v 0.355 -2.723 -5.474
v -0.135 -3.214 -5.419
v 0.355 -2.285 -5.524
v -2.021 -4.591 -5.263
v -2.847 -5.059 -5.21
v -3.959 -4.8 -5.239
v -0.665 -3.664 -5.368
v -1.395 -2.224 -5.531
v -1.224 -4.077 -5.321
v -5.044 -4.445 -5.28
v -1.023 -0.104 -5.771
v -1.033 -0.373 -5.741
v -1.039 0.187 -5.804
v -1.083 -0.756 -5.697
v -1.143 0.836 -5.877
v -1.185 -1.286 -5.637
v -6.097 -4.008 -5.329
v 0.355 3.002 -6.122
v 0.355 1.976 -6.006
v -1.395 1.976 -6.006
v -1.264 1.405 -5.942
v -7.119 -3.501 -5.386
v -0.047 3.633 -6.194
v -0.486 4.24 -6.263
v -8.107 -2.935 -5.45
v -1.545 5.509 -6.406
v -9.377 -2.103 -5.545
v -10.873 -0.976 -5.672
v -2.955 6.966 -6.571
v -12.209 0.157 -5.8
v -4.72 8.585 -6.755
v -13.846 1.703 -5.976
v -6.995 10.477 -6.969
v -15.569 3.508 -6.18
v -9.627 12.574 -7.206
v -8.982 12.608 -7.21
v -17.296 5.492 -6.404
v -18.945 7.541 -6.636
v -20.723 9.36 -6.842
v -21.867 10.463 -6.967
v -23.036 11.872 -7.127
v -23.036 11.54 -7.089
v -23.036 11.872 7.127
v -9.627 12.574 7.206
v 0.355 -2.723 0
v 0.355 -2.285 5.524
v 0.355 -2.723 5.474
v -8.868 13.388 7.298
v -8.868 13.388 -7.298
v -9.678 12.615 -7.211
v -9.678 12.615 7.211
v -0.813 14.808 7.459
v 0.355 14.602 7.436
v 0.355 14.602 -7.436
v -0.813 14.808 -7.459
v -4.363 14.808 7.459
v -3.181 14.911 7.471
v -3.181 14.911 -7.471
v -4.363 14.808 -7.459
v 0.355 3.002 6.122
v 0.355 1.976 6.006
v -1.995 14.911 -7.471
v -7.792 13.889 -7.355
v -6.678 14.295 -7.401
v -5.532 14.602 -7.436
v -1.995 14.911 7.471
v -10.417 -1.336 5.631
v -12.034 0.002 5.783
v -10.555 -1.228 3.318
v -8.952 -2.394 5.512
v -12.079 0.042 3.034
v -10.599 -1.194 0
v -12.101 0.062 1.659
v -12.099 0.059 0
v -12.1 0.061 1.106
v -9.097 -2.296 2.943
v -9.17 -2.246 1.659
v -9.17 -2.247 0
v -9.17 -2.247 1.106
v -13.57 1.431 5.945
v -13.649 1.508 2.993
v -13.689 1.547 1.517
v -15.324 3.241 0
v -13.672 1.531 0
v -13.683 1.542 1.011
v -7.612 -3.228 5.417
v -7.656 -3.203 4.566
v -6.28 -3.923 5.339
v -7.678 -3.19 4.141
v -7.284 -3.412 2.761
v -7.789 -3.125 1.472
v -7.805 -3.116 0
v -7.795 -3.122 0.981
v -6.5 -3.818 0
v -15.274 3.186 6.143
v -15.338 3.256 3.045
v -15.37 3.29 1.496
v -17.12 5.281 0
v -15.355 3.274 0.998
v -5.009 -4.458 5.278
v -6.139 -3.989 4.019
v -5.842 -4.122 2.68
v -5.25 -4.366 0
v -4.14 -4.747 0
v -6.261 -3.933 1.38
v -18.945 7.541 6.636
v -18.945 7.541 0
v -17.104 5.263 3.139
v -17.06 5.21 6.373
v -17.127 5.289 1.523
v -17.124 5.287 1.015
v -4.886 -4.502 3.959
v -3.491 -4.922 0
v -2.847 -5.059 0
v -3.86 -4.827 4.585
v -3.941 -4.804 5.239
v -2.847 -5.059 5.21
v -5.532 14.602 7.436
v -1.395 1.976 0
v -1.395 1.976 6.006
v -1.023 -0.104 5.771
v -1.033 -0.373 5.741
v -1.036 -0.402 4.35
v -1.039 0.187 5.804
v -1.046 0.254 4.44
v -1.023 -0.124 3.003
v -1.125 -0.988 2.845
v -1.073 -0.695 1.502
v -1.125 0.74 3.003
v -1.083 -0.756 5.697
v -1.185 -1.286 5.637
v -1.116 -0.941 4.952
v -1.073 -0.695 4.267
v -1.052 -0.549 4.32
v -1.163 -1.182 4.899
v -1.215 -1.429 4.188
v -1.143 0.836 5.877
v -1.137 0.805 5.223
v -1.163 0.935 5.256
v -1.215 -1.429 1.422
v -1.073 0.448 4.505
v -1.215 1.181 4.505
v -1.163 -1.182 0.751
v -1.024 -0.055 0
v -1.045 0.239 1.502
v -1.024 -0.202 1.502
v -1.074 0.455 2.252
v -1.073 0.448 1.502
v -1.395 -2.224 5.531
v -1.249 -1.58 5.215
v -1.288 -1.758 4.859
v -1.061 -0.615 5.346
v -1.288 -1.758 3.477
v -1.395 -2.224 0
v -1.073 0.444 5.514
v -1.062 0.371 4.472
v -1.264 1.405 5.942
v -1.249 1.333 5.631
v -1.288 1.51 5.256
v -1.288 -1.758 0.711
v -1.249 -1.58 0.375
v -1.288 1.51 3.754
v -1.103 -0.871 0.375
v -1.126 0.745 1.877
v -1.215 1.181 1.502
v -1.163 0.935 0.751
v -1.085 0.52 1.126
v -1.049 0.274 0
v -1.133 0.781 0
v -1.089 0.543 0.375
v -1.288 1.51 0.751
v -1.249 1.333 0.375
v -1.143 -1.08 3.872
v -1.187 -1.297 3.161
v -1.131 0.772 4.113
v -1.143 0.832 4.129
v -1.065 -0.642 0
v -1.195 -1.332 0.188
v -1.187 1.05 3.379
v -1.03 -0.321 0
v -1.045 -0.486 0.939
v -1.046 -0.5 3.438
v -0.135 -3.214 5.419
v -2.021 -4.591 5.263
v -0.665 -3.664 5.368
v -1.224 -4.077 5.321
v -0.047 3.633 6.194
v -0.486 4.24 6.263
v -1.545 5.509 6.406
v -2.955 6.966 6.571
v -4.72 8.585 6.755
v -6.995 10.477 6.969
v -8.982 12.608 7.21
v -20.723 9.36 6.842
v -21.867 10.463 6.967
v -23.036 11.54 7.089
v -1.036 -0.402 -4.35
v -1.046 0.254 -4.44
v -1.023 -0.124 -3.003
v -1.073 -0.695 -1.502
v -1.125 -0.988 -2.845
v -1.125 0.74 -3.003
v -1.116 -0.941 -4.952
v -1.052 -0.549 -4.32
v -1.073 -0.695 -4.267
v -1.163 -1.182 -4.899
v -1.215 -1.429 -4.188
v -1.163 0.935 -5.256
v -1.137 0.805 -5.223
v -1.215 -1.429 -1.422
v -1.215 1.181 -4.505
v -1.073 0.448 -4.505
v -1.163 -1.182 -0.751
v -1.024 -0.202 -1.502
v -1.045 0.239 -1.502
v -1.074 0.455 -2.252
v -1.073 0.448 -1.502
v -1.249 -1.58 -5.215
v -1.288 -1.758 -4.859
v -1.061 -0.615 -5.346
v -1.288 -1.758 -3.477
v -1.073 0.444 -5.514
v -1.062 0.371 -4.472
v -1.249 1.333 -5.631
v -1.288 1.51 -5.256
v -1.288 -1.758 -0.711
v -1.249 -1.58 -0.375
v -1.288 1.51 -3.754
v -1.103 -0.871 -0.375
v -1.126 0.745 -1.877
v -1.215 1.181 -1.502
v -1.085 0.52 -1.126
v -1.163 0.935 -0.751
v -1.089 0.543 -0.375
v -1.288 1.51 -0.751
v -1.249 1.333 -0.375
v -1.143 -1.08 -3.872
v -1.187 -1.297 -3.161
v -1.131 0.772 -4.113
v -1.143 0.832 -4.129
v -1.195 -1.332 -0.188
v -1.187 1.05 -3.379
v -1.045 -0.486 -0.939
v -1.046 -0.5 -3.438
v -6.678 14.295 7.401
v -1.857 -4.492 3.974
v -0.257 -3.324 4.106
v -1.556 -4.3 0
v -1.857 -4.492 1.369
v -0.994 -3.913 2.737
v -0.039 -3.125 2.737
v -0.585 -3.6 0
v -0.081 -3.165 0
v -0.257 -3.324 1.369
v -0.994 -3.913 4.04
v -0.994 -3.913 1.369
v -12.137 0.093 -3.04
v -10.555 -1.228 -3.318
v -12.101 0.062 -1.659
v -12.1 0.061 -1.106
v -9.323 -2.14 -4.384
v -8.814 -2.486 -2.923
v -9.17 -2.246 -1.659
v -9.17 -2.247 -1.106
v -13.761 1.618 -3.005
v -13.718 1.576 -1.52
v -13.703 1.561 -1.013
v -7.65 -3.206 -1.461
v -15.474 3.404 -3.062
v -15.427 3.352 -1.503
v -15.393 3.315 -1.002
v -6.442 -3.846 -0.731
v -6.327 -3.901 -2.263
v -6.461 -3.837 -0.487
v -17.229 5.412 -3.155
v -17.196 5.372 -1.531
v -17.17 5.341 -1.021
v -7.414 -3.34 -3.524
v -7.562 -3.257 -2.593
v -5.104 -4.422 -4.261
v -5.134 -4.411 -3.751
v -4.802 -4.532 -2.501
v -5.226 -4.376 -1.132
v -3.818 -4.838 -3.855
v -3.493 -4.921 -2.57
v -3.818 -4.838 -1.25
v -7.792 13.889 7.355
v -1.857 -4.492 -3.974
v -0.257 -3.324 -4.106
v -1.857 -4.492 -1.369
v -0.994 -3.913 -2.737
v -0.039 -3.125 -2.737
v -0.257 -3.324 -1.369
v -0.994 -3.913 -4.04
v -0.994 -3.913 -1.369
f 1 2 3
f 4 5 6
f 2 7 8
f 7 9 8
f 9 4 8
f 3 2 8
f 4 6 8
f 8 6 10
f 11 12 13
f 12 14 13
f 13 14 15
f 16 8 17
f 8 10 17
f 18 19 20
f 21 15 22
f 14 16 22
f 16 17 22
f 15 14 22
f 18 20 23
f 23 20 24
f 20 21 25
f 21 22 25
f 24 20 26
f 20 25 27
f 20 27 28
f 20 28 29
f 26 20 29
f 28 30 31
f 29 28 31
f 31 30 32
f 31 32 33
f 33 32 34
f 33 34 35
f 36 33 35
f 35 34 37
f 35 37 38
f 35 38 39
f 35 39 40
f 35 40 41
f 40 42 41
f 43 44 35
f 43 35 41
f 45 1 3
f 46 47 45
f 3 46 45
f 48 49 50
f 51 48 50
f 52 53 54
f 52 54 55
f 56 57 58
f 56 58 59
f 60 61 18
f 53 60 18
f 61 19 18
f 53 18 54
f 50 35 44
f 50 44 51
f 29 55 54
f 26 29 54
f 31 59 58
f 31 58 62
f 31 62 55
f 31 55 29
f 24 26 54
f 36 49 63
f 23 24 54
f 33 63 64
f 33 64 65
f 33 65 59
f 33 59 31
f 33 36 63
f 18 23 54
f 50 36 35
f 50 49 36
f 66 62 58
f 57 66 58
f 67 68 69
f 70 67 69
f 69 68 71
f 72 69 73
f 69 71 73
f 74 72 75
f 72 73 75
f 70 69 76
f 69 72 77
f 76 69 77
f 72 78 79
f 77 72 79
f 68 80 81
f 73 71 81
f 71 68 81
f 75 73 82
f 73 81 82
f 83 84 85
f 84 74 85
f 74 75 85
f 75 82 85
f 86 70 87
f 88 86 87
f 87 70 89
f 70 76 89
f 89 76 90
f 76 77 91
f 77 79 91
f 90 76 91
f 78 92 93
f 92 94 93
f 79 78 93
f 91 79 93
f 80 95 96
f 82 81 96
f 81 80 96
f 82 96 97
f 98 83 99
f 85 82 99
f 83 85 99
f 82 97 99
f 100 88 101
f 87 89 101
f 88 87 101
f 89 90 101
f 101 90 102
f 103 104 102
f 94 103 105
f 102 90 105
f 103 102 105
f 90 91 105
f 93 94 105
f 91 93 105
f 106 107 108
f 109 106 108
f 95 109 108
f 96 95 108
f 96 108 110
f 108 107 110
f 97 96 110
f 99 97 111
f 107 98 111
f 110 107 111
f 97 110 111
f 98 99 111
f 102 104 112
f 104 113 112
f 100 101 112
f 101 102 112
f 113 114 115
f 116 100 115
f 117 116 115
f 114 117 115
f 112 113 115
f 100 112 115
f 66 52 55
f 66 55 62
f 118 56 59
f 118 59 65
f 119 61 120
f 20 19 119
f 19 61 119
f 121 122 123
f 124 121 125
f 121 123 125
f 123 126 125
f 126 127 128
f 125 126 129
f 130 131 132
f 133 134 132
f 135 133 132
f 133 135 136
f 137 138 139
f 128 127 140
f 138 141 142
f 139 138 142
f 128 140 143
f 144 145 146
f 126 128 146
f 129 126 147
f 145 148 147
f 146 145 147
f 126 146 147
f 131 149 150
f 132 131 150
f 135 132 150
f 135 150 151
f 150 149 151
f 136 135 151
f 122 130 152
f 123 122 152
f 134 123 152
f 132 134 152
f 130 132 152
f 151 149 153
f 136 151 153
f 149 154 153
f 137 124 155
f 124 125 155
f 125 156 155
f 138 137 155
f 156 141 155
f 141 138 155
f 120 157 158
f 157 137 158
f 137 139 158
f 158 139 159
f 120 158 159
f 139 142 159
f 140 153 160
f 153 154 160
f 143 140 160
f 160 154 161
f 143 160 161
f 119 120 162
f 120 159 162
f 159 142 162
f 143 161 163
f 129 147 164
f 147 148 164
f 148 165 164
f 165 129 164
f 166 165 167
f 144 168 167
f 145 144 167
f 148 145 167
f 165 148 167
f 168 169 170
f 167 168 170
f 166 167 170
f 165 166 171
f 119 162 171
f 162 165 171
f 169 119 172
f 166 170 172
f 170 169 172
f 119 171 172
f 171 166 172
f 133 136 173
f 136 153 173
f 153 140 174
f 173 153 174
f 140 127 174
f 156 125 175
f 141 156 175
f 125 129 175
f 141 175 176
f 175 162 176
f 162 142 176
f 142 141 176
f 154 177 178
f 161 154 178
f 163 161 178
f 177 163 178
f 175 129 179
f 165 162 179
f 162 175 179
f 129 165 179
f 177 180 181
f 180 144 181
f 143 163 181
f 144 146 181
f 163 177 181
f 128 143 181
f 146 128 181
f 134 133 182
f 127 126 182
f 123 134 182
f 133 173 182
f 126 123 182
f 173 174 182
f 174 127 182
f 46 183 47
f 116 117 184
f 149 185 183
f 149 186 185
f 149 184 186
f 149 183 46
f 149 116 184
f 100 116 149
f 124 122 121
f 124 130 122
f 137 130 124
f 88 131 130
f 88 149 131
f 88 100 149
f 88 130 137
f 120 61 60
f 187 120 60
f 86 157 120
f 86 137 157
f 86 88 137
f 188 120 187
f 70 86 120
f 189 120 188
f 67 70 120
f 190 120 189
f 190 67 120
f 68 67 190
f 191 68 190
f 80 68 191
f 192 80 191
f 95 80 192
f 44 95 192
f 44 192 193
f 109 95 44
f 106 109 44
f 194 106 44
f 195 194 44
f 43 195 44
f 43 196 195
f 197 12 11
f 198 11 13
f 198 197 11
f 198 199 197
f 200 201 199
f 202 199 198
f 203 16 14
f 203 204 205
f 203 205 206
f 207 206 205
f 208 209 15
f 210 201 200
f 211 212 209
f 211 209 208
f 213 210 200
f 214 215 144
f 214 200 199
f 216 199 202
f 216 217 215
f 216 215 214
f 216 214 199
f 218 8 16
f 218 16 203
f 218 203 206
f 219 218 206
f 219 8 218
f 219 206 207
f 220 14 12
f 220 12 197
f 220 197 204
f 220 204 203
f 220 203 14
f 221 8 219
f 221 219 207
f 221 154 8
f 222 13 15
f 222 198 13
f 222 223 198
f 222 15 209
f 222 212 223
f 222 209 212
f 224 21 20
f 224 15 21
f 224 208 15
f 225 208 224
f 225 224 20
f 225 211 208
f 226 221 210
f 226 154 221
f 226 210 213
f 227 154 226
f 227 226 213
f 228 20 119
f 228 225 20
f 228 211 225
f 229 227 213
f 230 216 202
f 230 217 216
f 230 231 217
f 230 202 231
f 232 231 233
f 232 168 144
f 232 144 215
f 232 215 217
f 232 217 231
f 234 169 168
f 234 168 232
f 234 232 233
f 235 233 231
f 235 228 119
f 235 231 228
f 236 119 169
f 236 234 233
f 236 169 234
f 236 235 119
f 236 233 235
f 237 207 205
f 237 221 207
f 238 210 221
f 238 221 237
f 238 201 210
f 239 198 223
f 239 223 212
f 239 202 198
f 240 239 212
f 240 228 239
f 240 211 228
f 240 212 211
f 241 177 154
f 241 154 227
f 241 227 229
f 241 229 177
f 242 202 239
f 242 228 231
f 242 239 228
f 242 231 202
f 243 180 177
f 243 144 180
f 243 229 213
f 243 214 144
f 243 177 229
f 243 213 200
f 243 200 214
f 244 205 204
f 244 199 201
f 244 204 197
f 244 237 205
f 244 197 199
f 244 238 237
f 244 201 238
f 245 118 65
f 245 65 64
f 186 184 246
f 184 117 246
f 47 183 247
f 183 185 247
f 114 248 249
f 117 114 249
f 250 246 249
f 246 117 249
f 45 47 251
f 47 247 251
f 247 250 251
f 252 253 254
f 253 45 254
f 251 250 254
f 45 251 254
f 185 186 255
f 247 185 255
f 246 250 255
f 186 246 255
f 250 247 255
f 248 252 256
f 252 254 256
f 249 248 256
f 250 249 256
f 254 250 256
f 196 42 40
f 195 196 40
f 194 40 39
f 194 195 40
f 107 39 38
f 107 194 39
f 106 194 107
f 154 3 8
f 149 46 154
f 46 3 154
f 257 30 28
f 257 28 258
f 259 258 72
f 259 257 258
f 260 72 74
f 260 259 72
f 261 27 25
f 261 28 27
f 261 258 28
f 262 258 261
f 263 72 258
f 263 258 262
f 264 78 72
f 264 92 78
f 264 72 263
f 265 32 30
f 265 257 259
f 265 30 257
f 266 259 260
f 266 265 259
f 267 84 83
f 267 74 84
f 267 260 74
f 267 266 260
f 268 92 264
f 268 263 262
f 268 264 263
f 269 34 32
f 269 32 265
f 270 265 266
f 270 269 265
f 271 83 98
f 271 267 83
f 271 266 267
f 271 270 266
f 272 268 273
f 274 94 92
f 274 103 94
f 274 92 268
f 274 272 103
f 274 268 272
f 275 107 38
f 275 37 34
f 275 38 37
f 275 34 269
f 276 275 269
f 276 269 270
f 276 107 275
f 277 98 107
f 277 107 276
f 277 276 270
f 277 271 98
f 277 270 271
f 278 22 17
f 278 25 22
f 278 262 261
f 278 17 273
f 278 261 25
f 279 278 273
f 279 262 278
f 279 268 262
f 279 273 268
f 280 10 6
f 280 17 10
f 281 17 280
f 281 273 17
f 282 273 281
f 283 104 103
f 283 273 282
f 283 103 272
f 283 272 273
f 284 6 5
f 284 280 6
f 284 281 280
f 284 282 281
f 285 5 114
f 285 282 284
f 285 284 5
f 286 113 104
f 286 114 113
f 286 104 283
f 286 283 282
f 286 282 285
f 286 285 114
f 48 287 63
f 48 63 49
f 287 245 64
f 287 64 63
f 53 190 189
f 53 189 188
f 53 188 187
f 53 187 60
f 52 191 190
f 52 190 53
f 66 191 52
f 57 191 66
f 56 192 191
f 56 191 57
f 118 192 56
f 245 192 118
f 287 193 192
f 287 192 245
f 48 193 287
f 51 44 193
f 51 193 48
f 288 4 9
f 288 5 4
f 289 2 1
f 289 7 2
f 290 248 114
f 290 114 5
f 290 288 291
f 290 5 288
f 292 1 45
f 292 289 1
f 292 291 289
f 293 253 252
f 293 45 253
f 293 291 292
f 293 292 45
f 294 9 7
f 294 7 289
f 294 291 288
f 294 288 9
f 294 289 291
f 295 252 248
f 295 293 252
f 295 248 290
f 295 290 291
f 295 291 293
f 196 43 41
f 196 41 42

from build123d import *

# Parameters (mm, degrees)
SALIENTE_EXTRUIR1_DEPTH      = 7.21
SALIENTE_EXTRUIR2_DEPTH      = 7.21
SALIENTE_EXTRUIR2_DEPTH_BACK = 7.21
CORTAR_EXTRUIR2_DEPTH        = 28.232395202
CORTAR_EXTRUIR2_DEPTH_BACK   = 28.232395202
SALIENTE_EXTRUIR3_START      = -5.2099999
SALIENTE_EXTRUIR3_DEPTH      = 10.4199998
SALIENTE_EXTRUIR3_START_2    = -7.470713012
SALIENTE_EXTRUIR3_2_DEPTH    = 14.941425924
SALIENTE_EXTRUIR3_START_3    = -23.035921246
SALIENTE_EXTRUIR3_3_DEPTH    = 24.035921246


with BuildPart() as part:
    # Croquis1 → Saliente-Extruir1 (new, symmetric)
    with BuildSketch(Plane.XY):
        with BuildLine():
            add(Edge.make_bspline(
                [(-18.945192114, 7.540918896), (-10.215008384, -3.697644103), (-2.846604825, -5.059081104)],
                knots=[0.497667241, 0.497667241, 0.497667241, 0.49955428, 0.49955428, 0.49955428], degree=2, weights=[1, 1, 1]))
            add(Edge.make_bspline(
                [(-2.846604825, -5.059081104), (-0.742366882, -3.9352066), (0.355125, -2.723253227)],
                knots=[0.498812075, 0.498812075, 0.498812075, 0.499412845, 0.499412845, 0.499412845], degree=2, weights=[1, 1, 1]))
            Line((0.355125, -2.723253227), (0.355125, -2.284841781))
            Line((0.355125, -2.284841781), (-1.394875, -2.223730435))
            add(Edge.make_bspline(
                [(-1.394875, -2.223730435), (-0.90753067, -0.123730435), (-1.394875, 1.976269565)],
                knots=[0, 0, 0, 1, 1, 1], degree=2, weights=[1, 3.231801219, 1]))
            Line((-1.394875, 1.976269565), (0.355125, 2.284841781))
            Line((0.355125, 2.284841781), (0.355125, 3.001549529))
            add(Edge.make_bspline(
                [(0.355125, 3.001549529), (-1.44872627, 6.058427314), (-6.994875026, 10.477389992)],
                knots=[0.500820705, 0.500820705, 0.500820705, 0.502013312, 0.502013312, 0.502013312], degree=2, weights=[1, 1, 1]))
            Line((-6.994875026, 10.477389992), (-8.981845695, 12.608155172))
            Line((-8.981845695, 12.608155172), (-23.035921146, 11.871612288))
            Line((-23.035921146, 11.871612288), (-23.035921146, 11.54013782))
            ThreePointArc((-23.035921146, 11.54013782), (-20.949684518, 9.582335705), (-18.945192114, 7.540918896))
        make_face()
    extrude(amount=SALIENTE_EXTRUIR1_DEPTH, both=True)

    # Croquis4 → Saliente-Extruir2 (add, two sides: drawn at the far end of the back side and taken through both)
    with BuildSketch(Plane.XY.offset(-SALIENTE_EXTRUIR2_DEPTH_BACK)):
        Polygon((-1.394875, 1.976269565), (0.355125, 2.284841781), (0.355125, 1.976269565), align=None)
    extrude(amount=SALIENTE_EXTRUIR2_DEPTH + SALIENTE_EXTRUIR2_DEPTH_BACK)

    # Croquis6 → Cortar-Extruir2 (cut, two sides: drawn at the far end of the back side and taken through both)
    with BuildSketch(Plane(origin=(0, 0, 0), x_dir=(0, 0, -1), z_dir=(1, 0, 0)).offset(-CORTAR_EXTRUIR2_DEPTH_BACK)):
        Polygon((7.21, 12.608155172), (7.21, -5.059081104), (5.21, -5.059081104), align=None)
        Polygon((-7.21, 12.608155172), (-7.21, -5.059081104), (-5.21, -5.059081104), align=None)
    extrude(amount=CORTAR_EXTRUIR2_DEPTH + CORTAR_EXTRUIR2_DEPTH_BACK, mode=Mode.SUBTRACT)

    # Saliente-Extruir3: read off the stored shape, not the designer's step
    # Saliente-Extruir3 outline → Saliente-Extruir3 (add)
    with BuildSketch(Plane.XY.offset(SALIENTE_EXTRUIR3_START)):
        with BuildLine():
            add(Edge.make_bspline(
                [(-9.626736117, 12.574357897), (-9.652391468, 12.594799115), (-9.678046818, 12.615240333)],
                knots=[0.502296281, 0.502296281, 0.502296281, 0.502301797, 0.502301797, 0.502301797], degree=2))
            Line((-9.626736117, 12.574357897), (-8.981845695, 12.608155172))
            Line((-8.981845695, 12.608155172), (-6.994875026, 10.477389992))
            add(Edge.make_bspline(
                [(0.355125, 3.001549529), (-1.44872627, 6.058427314), (-6.994875026, 10.477389992)],
                knots=[0.500820705, 0.500820705, 0.500820705, 0.502013312, 0.502013312, 0.502013312], degree=2))
            Line((0.355125, 3.001549529), (0.355125, 14.601784752))
            Line((0.355125, 14.601784752), (-0.813216768, 14.807794929))
            Line((-0.813216768, 14.807794929), (-1.995067613, 14.91119348))
            Line((-1.995067613, 14.91119348), (-3.181432936, 14.91119348))
            Line((-3.181432936, 14.91119348), (-4.363283782, 14.807794929))
            Line((-4.363283782, 14.807794929), (-5.53162555, 14.601784752))
            Line((-5.53162555, 14.601784752), (-6.677566455, 14.294730812))
            Line((-6.677566455, 14.294730812), (-7.792385195, 13.888969974))
            Line((-7.792385195, 13.888969974), (-8.867597325, 13.387590324))
            Line((-8.867597325, 13.387590324), (-9.678046818, 12.615240333))
        make_face()
    extrude(amount=SALIENTE_EXTRUIR3_DEPTH)

    # Saliente-Extruir3 2 outline → Saliente-Extruir3 2 (add)
    with BuildSketch(Plane.XY.offset(SALIENTE_EXTRUIR3_START_2)):
        with BuildLine():
            add(Edge.make_bspline(
                [(-9.626736117, 12.574357897), (-9.652391468, 12.594799115), (-9.678046818, 12.615240333)],
                knots=[0.502296281, 0.502296281, 0.502296281, 0.502301797, 0.502301797, 0.502301797], degree=2))
            Line((-9.626736117, 12.574357897), (-8.981845695, 12.608155172))
            Line((-8.981845695, 12.608155172), (-6.994875026, 10.477389992))
            add(Edge.make_bspline(
                [(0.355125, 3.001549529), (-1.44872627, 6.058427314), (-6.994875026, 10.477389992)],
                knots=[0.500820705, 0.500820705, 0.500820705, 0.502013312, 0.502013312, 0.502013312], degree=2))
            Line((0.355125, 3.001549529), (0.355125, 14.601784752))
            Line((0.355125, 14.601784752), (-0.813216768, 14.807794929))
            Line((-0.813216768, 14.807794929), (-1.995067613, 14.91119348))
            Line((-1.995067613, 14.91119348), (-3.181432936, 14.91119348))
            Line((-3.181432936, 14.91119348), (-4.363283782, 14.807794929))
            Line((-4.363283782, 14.807794929), (-5.53162555, 14.601784752))
            Line((-5.53162555, 14.601784752), (-6.677566455, 14.294730812))
            Line((-6.677566455, 14.294730812), (-7.792385195, 13.888969974))
            Line((-7.792385195, 13.888969974), (-8.867597325, 13.387590324))
            Line((-8.867597325, 13.387590324), (-9.678046818, 12.615240333))
        make_face()
    extrude(amount=SALIENTE_EXTRUIR3_2_DEPTH)

    # Saliente-Extruir3 3 outline → Saliente-Extruir3 3 (cut)
    with BuildSketch(Plane.YZ.offset(SALIENTE_EXTRUIR3_START_3)):
        Polygon((2, 7.470712912), (2, 6.009115492), (14.91119348, 7.470712912), align=None)
        Polygon((14.91119348, -7.470712912), (2, -6.009115492), (2, -7.470713012), align=None)
    extrude(amount=SALIENTE_EXTRUIR3_3_DEPTH, mode=Mode.SUBTRACT)


solid = part.part
